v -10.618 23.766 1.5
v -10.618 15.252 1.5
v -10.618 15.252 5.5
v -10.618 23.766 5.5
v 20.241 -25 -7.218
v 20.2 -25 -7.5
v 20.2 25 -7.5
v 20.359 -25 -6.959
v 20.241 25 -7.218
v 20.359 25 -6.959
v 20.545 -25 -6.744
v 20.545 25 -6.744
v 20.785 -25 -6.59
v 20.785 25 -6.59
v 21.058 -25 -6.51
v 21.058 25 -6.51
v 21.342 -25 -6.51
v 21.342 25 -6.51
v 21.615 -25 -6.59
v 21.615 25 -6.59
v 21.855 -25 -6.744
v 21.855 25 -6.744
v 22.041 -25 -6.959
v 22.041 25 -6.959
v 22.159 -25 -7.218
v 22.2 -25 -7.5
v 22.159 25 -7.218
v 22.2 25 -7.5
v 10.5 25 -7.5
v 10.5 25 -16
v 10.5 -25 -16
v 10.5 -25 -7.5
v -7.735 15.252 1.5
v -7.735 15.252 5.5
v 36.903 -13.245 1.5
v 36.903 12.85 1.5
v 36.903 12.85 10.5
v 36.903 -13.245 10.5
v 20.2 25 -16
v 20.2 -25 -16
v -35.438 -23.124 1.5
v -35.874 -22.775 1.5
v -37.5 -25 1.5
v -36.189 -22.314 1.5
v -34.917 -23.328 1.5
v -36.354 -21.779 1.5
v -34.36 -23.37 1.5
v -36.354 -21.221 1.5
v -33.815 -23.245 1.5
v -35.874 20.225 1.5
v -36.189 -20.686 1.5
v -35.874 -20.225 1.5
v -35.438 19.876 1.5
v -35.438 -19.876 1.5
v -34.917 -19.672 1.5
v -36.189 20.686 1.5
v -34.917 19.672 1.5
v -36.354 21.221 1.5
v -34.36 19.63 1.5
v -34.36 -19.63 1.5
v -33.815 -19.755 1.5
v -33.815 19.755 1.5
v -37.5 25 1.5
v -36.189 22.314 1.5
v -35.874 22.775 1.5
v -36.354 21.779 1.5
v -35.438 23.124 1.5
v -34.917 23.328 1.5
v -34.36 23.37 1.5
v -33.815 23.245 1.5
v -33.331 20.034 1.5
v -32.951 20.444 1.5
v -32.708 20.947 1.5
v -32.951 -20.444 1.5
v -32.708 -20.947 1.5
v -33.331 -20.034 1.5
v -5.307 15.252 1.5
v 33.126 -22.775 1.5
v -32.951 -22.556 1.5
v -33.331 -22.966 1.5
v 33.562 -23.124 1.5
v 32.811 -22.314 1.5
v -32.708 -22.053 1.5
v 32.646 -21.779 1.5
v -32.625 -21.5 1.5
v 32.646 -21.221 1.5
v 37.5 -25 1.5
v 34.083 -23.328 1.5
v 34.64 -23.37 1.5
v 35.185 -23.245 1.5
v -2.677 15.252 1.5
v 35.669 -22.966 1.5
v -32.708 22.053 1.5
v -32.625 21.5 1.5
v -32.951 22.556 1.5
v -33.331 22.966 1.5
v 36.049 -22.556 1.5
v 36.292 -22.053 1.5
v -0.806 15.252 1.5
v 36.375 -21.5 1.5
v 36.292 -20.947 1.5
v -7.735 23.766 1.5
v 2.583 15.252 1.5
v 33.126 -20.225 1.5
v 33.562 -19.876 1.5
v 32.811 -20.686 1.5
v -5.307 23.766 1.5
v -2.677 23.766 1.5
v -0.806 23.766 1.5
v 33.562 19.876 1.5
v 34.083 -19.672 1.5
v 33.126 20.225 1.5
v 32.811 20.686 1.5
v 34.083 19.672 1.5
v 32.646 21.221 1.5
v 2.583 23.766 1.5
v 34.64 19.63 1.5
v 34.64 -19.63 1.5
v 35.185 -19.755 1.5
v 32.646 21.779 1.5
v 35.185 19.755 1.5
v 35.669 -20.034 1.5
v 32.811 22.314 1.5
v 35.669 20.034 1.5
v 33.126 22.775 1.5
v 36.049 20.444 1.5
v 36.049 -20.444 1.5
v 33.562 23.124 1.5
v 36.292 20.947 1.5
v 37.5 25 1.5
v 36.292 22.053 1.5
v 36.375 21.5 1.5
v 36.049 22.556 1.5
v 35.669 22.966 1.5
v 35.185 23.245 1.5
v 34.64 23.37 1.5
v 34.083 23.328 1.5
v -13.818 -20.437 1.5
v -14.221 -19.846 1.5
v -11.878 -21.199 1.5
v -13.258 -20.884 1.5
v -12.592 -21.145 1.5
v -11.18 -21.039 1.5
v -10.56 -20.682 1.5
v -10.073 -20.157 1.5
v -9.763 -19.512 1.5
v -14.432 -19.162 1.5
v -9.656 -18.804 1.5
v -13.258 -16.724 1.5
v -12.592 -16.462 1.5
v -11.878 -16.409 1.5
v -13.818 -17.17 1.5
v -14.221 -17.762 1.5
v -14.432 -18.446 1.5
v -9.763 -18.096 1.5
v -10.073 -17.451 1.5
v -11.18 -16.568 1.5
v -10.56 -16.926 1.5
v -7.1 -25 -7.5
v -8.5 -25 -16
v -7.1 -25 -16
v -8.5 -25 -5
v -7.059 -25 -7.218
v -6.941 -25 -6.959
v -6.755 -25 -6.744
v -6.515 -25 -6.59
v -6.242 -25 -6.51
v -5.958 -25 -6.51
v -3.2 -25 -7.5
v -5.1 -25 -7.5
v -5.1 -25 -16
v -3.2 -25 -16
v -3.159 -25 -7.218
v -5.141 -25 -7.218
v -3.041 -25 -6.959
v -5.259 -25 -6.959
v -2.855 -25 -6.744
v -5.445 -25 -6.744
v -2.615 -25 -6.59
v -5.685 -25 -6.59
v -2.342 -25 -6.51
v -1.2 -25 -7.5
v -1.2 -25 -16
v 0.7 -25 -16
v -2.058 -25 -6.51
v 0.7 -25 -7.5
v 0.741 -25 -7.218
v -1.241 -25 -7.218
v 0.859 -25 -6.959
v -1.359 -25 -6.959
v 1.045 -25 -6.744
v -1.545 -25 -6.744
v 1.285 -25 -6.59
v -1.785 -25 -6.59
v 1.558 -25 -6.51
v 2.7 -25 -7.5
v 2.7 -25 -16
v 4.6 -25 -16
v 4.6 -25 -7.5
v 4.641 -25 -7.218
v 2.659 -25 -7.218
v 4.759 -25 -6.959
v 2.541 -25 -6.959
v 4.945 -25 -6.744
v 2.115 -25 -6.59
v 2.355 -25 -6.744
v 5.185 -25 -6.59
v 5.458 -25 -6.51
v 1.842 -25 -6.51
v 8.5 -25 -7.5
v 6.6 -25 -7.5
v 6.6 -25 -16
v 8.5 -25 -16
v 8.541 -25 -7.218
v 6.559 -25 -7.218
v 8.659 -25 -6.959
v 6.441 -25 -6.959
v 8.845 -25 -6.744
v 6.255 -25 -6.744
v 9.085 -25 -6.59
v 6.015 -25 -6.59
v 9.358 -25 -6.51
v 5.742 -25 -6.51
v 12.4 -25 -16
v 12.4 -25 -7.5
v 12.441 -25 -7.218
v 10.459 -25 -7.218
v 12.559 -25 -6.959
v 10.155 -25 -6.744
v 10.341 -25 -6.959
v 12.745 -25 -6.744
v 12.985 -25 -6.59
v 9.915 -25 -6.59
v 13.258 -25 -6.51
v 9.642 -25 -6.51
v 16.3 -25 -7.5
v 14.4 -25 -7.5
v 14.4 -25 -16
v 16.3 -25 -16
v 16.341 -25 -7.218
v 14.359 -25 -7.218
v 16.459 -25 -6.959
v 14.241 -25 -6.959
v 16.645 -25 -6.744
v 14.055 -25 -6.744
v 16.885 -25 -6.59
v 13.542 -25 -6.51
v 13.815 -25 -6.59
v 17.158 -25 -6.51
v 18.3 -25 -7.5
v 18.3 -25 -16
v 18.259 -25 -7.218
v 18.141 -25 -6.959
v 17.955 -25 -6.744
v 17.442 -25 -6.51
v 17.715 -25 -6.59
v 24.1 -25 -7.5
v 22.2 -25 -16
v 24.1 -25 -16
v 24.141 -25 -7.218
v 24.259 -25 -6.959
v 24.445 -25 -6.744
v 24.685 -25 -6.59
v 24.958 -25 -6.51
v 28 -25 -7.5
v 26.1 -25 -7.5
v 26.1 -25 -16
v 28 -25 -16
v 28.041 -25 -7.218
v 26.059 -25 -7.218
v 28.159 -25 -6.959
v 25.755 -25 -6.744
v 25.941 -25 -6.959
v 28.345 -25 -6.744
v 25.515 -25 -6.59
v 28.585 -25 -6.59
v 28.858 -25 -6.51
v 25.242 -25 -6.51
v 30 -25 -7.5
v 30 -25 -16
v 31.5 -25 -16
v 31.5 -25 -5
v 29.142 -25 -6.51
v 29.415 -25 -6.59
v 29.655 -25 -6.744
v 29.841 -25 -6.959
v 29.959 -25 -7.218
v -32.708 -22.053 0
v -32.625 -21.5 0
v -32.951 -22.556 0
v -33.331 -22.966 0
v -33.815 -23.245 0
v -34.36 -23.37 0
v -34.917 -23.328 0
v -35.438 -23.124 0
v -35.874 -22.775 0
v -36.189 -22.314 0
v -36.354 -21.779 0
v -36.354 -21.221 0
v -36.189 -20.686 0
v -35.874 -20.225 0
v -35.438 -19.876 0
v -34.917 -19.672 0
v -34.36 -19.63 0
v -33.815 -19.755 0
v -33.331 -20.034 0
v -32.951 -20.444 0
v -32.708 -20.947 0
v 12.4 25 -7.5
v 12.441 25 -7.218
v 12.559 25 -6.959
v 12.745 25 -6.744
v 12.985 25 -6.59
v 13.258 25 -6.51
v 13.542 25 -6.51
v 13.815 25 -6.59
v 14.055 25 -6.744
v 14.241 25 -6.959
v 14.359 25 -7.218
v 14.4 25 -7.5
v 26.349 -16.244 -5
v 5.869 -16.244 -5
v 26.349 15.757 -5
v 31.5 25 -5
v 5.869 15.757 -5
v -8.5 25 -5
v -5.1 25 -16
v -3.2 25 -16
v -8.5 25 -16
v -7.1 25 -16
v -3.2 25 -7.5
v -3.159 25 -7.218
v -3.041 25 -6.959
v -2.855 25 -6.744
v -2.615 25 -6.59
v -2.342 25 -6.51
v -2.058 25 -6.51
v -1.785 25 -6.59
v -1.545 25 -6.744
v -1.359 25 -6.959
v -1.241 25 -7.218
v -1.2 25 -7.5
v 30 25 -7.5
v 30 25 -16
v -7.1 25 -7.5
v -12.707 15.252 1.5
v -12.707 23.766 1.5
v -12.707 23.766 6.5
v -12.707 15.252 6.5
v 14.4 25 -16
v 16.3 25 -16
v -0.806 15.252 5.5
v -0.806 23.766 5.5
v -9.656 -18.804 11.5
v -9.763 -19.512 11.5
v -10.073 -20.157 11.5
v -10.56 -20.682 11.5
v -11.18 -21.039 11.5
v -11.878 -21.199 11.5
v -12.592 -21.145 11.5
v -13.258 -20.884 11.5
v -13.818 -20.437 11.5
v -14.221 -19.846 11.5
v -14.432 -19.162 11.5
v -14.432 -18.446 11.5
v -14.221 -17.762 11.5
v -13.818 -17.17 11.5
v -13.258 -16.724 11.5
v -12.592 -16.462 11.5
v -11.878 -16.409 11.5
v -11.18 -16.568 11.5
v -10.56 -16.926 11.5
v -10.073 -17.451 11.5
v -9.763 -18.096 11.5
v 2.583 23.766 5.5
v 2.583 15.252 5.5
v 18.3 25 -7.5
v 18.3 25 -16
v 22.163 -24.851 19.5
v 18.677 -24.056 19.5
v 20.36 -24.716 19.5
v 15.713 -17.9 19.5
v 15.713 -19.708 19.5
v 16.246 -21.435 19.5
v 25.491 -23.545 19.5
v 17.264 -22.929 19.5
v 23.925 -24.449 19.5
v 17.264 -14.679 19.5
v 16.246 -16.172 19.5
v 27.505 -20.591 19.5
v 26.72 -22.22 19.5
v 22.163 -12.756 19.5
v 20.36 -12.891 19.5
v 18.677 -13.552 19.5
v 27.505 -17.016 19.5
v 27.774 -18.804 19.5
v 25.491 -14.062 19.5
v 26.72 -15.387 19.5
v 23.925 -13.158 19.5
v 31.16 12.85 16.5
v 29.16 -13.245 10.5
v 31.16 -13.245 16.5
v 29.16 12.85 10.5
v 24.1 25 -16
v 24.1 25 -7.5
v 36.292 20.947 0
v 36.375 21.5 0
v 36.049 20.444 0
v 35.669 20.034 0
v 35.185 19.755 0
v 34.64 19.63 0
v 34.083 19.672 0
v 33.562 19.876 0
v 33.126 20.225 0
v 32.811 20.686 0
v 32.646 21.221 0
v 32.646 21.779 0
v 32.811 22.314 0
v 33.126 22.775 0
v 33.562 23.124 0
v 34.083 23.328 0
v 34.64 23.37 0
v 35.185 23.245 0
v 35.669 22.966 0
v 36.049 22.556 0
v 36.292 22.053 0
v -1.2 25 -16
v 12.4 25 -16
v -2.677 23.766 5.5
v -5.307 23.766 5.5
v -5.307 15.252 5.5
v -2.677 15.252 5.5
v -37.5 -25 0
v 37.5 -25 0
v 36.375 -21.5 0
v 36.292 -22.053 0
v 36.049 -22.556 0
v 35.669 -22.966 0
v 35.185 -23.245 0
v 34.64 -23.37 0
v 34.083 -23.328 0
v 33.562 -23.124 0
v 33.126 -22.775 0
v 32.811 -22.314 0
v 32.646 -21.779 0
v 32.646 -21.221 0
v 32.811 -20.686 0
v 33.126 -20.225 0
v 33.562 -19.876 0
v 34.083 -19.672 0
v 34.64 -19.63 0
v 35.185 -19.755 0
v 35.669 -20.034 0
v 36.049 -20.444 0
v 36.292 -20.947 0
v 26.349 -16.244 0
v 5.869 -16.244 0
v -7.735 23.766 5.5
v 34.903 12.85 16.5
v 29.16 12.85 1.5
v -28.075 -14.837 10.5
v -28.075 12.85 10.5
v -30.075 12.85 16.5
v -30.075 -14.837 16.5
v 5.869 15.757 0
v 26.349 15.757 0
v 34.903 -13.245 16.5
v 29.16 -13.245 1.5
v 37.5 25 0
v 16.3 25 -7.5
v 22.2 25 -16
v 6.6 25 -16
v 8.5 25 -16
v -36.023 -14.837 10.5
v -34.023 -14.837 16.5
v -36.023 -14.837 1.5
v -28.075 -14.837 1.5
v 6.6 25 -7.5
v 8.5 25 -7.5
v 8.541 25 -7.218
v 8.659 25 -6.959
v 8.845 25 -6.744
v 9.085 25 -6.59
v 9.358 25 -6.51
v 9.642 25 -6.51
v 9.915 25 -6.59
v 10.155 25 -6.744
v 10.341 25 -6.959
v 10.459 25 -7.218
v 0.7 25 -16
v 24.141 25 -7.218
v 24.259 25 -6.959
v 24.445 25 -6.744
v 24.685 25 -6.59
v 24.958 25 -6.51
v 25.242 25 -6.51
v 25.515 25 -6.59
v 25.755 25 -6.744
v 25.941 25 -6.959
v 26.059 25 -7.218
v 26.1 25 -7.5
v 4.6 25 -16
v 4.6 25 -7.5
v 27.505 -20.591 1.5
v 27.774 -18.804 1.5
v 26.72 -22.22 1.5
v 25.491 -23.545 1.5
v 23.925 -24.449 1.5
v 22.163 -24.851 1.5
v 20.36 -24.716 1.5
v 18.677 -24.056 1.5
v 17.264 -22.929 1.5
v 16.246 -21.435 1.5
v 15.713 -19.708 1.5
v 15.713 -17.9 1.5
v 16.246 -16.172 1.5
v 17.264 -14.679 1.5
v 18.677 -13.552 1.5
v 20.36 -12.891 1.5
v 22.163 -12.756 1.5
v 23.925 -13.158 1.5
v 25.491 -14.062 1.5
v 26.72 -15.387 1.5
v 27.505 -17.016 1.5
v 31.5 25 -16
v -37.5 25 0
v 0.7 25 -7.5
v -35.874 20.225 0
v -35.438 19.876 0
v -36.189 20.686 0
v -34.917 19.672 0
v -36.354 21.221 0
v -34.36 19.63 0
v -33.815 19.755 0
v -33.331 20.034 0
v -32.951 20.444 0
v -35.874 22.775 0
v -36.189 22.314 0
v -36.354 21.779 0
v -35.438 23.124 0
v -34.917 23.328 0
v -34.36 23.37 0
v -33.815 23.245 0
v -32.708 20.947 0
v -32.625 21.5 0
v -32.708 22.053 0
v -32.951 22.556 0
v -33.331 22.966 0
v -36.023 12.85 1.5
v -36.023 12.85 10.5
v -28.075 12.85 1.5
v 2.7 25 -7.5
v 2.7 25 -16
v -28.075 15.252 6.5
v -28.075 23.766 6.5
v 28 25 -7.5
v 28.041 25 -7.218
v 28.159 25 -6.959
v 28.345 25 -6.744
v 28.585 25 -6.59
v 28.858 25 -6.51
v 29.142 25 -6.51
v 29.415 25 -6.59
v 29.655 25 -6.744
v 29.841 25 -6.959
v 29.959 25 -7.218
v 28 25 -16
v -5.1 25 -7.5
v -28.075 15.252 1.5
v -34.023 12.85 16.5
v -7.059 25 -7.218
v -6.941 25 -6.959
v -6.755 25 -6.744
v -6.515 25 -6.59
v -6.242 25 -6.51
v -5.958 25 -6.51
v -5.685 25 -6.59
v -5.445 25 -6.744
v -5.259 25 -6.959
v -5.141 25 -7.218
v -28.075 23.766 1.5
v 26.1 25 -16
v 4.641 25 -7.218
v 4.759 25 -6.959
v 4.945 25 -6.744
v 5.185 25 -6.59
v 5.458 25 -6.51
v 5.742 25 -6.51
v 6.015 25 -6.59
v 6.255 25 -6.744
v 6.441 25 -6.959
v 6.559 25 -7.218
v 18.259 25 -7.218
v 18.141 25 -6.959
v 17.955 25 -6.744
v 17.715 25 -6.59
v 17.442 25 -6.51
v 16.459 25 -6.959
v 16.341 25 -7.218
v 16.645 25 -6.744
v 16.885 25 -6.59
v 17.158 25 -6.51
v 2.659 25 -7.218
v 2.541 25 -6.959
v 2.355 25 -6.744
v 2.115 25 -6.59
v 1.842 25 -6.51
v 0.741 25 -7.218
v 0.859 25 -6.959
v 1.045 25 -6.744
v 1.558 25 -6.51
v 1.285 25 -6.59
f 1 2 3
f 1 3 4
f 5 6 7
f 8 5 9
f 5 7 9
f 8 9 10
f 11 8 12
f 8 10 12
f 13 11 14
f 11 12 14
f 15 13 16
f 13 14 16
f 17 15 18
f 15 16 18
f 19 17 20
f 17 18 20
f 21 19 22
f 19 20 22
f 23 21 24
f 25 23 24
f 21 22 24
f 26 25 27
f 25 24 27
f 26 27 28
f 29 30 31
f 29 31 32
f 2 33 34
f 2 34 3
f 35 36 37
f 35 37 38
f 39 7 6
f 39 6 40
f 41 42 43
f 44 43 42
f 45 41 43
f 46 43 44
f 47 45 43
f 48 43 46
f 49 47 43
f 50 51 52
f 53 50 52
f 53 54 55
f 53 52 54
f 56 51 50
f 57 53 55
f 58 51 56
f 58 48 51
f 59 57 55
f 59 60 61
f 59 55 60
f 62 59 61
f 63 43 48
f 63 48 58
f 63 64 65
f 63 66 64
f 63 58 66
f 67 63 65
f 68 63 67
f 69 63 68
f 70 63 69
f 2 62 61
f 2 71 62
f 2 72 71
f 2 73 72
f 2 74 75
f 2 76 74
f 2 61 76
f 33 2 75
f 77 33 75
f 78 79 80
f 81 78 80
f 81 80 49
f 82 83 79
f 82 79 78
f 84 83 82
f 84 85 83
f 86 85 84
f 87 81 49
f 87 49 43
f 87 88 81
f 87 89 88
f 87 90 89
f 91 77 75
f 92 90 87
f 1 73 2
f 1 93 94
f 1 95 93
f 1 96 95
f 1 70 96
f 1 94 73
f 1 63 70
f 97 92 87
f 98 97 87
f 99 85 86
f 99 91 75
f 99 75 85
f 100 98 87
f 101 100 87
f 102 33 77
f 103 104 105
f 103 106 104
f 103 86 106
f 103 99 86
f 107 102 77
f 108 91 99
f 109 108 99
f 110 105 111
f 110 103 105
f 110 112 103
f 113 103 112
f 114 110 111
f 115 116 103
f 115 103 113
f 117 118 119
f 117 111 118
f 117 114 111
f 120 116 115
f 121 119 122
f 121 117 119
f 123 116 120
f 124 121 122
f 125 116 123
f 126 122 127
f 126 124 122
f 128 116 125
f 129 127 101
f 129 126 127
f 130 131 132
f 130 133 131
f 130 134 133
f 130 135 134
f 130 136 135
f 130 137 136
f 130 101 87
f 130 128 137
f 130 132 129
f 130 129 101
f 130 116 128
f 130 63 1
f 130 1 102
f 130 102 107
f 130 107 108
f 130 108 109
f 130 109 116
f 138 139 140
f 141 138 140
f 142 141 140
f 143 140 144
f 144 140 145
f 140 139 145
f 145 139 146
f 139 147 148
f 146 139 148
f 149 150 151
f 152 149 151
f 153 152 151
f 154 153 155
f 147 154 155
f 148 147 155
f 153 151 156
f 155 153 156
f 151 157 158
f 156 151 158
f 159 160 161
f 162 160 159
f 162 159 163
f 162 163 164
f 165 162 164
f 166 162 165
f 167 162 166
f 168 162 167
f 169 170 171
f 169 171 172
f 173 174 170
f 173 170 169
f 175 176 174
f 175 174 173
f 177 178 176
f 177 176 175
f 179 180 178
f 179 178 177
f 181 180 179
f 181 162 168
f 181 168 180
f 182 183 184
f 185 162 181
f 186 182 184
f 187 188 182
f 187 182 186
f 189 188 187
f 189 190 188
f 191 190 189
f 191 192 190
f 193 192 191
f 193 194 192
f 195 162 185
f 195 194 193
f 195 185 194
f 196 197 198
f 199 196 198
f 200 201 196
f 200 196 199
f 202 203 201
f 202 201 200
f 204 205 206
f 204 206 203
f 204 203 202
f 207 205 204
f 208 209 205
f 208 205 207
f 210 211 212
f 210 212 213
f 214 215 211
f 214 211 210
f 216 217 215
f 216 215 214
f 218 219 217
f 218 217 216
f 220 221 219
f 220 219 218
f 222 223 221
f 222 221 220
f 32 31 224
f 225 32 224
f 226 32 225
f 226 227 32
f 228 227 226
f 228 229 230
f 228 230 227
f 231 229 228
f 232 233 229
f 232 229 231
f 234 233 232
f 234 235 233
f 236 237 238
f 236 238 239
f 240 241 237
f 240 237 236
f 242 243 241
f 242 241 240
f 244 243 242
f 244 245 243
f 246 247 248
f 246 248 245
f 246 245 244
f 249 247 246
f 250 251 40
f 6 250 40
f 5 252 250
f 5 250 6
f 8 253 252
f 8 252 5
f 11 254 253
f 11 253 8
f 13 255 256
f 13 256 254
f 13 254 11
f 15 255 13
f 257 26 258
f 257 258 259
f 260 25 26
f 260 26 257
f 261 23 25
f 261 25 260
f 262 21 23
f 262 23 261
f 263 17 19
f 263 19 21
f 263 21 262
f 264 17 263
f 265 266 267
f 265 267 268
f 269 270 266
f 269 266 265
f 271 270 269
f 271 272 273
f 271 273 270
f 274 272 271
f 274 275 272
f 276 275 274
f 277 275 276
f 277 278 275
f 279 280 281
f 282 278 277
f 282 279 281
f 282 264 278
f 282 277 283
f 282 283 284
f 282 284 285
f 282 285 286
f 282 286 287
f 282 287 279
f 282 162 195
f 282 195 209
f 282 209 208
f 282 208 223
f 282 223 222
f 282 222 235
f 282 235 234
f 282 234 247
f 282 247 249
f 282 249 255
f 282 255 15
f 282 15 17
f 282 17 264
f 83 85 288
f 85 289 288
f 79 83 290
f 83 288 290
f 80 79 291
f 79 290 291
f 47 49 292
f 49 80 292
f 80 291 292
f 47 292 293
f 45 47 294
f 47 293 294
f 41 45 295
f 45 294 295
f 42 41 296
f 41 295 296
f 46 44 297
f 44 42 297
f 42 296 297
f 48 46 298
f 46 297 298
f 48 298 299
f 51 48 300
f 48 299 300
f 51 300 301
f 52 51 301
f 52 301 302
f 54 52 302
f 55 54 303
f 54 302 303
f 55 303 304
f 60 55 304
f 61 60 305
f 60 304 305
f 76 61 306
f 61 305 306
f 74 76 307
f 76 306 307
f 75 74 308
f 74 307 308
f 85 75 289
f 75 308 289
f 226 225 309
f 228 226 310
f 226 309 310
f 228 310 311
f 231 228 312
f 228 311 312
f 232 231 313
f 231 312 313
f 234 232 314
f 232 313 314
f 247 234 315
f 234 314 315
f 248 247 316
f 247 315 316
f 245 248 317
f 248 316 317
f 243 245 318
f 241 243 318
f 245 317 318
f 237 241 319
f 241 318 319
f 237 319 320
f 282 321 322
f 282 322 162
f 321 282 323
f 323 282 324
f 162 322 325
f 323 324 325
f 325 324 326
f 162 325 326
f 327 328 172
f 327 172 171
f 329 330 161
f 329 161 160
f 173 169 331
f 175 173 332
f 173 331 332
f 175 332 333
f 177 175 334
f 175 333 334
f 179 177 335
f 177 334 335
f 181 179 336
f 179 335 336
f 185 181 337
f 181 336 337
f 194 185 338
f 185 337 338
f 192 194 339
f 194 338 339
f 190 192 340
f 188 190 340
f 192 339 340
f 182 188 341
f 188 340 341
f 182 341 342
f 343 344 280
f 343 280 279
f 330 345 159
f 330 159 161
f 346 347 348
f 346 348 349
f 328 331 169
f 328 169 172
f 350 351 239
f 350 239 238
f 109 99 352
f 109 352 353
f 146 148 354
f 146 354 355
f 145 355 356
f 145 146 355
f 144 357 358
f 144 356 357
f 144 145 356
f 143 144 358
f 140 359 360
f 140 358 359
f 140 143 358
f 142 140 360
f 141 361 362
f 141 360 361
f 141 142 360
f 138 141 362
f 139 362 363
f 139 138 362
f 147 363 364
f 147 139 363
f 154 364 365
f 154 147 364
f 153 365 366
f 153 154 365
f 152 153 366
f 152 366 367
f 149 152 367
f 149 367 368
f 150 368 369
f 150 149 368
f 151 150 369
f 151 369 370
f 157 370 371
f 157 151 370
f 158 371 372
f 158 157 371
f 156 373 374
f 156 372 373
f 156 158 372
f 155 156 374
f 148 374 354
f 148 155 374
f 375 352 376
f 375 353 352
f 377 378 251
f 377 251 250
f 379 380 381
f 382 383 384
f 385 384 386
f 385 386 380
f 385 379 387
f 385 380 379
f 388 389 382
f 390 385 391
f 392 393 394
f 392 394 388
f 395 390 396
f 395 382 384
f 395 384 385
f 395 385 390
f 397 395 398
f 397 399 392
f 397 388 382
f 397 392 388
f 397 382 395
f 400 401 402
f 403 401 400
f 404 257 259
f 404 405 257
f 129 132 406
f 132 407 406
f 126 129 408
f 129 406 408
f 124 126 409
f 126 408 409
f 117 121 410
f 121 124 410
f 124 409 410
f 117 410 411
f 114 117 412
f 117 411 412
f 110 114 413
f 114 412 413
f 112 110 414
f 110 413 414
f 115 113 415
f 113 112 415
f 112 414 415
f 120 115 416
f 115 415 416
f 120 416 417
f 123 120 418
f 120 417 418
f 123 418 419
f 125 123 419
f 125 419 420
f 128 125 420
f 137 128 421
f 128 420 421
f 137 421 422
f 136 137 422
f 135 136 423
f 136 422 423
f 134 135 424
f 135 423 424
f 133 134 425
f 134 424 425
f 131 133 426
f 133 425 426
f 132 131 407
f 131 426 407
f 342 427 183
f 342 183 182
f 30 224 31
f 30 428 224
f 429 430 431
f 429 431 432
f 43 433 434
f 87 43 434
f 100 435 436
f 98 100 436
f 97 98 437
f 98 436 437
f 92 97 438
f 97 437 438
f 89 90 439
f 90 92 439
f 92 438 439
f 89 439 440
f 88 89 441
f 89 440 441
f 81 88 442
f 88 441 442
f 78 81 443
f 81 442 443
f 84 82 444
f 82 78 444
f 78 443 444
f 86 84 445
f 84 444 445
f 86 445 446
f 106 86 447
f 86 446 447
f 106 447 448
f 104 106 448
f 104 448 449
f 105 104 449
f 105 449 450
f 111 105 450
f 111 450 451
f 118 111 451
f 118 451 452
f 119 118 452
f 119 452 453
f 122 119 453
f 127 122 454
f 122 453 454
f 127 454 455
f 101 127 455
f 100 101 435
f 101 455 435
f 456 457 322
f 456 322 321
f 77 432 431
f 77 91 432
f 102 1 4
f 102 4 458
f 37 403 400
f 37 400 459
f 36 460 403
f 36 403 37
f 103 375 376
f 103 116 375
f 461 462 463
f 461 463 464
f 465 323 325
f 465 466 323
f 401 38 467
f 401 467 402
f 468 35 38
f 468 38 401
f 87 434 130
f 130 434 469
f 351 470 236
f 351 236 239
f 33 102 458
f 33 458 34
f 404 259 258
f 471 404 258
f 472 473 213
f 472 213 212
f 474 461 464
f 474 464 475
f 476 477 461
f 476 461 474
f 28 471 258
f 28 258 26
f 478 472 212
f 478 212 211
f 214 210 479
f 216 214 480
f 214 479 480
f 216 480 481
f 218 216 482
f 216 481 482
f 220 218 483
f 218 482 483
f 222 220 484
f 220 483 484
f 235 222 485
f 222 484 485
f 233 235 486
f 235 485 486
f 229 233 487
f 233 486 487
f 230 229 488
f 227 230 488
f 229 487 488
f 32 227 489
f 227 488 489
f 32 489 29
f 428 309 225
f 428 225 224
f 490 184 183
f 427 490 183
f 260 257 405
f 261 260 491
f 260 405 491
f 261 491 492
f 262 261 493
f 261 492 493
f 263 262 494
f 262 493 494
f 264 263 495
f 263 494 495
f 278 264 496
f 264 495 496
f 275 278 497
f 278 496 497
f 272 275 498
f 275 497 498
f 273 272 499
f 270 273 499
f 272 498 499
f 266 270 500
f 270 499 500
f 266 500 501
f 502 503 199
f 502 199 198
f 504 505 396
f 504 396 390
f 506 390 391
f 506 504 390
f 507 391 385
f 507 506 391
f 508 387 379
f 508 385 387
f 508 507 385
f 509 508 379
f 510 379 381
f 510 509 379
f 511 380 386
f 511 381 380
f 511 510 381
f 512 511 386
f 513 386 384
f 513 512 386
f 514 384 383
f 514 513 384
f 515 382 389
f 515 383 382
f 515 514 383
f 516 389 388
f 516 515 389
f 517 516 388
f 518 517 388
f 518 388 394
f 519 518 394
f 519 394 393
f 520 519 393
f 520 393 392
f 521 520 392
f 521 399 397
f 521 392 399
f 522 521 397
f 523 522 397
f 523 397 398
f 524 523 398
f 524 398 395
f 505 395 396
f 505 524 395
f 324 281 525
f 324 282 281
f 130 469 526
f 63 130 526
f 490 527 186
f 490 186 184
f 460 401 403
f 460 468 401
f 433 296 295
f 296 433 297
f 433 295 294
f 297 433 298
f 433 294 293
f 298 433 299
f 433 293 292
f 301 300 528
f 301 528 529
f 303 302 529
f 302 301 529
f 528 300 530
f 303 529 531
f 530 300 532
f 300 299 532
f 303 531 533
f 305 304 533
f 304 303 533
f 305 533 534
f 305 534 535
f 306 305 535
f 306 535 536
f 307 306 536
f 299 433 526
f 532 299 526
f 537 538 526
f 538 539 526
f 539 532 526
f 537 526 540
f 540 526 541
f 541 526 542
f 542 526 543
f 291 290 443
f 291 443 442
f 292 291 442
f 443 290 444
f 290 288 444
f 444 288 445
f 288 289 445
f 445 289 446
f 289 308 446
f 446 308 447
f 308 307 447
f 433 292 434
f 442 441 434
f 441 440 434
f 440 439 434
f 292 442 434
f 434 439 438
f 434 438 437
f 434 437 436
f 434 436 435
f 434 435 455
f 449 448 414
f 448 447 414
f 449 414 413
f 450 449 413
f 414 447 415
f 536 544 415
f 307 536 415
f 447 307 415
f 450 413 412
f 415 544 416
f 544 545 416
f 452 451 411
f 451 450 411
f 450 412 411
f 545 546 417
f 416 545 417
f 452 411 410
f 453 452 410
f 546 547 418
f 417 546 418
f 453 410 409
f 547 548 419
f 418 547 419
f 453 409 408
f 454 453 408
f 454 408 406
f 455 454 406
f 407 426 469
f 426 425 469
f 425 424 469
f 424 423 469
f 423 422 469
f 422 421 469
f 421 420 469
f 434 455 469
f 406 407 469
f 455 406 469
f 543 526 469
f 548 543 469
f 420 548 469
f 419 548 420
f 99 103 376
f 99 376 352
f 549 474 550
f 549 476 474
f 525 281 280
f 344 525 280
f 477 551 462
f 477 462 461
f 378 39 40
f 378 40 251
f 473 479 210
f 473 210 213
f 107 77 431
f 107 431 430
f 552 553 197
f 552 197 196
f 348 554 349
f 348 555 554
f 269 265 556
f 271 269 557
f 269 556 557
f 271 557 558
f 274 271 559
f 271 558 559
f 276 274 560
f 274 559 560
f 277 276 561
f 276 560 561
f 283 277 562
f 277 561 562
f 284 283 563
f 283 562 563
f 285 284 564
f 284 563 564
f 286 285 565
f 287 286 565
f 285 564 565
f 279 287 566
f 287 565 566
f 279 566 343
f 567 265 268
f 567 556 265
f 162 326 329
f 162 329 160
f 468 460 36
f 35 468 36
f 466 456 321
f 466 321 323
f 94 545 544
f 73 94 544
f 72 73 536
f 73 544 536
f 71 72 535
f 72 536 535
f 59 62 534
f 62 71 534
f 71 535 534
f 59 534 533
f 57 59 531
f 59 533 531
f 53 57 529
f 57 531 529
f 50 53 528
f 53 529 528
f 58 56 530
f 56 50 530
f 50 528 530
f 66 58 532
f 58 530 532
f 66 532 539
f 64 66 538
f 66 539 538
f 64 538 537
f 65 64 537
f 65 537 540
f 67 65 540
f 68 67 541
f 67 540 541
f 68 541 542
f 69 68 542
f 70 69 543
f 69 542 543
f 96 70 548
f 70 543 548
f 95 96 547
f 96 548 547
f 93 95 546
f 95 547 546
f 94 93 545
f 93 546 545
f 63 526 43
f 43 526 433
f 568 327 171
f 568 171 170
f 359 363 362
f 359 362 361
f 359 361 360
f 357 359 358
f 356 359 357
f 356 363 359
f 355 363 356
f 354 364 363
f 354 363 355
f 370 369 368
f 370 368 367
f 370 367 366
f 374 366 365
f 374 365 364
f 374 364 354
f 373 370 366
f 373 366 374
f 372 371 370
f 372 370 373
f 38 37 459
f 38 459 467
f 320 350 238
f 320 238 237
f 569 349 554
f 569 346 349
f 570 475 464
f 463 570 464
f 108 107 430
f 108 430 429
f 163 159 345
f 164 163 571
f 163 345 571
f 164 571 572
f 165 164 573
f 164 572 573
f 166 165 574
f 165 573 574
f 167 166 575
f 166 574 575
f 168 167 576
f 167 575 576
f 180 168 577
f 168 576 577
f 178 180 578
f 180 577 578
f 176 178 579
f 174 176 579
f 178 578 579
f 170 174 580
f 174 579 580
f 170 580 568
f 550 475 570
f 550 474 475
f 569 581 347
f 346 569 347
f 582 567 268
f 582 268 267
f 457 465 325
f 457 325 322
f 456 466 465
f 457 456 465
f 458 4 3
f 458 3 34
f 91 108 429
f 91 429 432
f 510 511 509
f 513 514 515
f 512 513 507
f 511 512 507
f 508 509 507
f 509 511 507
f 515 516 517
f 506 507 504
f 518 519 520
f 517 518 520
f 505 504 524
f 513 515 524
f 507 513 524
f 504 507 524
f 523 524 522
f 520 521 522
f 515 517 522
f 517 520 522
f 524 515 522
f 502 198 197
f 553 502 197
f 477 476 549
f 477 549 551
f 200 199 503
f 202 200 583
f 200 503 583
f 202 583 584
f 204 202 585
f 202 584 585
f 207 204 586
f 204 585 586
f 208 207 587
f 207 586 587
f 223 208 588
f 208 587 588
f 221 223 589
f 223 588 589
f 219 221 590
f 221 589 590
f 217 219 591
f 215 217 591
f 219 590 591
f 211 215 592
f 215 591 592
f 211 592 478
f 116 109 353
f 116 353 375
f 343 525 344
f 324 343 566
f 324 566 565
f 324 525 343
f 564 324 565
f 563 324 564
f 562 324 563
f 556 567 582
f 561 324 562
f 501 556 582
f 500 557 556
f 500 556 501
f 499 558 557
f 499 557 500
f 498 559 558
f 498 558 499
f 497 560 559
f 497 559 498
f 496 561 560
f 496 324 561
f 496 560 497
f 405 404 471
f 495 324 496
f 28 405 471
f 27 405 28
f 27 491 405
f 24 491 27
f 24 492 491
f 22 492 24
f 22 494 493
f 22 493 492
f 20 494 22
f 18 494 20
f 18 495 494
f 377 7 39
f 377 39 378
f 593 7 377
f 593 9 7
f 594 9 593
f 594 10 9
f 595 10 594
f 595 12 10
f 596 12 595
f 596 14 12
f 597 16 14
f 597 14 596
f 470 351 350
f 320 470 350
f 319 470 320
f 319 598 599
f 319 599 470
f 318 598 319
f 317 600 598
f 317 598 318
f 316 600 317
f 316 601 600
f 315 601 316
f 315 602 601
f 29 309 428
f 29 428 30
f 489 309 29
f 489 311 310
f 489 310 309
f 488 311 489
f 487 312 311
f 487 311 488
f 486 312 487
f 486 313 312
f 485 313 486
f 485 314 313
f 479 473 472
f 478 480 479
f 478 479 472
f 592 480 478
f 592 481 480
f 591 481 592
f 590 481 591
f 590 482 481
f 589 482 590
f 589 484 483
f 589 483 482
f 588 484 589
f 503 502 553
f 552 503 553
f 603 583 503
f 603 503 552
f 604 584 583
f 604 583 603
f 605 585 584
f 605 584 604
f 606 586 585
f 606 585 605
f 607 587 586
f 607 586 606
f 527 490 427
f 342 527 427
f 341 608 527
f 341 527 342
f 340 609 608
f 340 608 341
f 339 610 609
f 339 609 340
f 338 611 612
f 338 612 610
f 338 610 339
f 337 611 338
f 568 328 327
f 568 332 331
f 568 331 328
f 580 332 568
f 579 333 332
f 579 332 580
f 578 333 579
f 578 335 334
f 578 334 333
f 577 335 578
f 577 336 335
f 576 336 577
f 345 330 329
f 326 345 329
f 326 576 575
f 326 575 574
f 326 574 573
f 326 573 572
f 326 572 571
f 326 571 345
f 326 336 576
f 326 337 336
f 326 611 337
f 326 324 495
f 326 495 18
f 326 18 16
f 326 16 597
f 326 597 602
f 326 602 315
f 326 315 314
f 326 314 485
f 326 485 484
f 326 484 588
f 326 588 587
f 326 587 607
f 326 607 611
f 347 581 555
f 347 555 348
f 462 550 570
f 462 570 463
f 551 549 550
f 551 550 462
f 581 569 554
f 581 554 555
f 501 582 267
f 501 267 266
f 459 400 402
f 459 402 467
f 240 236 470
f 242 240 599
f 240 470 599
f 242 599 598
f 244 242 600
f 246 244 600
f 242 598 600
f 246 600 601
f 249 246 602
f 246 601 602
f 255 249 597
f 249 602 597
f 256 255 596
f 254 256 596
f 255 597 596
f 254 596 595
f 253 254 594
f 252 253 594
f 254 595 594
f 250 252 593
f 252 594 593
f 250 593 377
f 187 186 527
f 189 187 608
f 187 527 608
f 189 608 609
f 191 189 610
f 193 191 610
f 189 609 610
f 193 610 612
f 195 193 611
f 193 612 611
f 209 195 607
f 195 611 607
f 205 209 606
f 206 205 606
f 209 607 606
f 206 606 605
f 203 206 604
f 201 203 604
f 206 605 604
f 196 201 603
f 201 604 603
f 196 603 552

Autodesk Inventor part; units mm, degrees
ref_plane "YZ Plane" through (0, 0, 0) normal (1, 0, 0) x (0, 1, 0)
ref_plane "XZ Plane" through (0, 0, 0) normal (0, 1, 0) x (-1, 0, 0)
ref_plane "XY Plane" through (0, 0, 0) normal (0, 0, 1) x (1, 0, 0)
sketch "Skizze1" plane through (0, 0, 0) normal (0, 0, 1) x (1, 0, 0)
  line L0 (-37.5, -25) -> (37.5, -25)
  line L1 (37.5, -25) -> (37.5, 25)
  line L2 (37.5, 25) -> (-37.5, 25)
  line L3 (-37.5, 25) -> (-37.5, -25)
  line L4 (-37.5, -25) -> (37.5, 25) construction
  line L5 (37.5, -25) -> (-37.5, 25) construction
  circle A0 centre (-34.5, 21.5) radius 1.875
  circle A1 centre (-34.5, -21.5) radius 1.875
  line L6 (-34.5, 21.5) -> (-34.5, -21.5) construction
  line L7 (-37.5, 0) -> (37.5, 0) construction
  line L8 (34.5, -21.5) -> (-34.5, -21.5) construction
  line L9 (-34.5, -21.5) -> (-34.5, 21.5) construction
  line L10 (-34.5, 21.5) -> (34.5, 21.5) construction
  line L11 (34.5, 21.5) -> (34.5, -21.5) construction
  line L12 (34.5, -21.5) -> (-34.5, 21.5) construction
  line L13 (-34.5, -21.5) -> (34.5, 21.5) construction
  circle A2 centre (34.5, 21.5) radius 1.875
  circle A3 centre (34.5, -21.5) radius 1.875
  point P0 (0, 0)
  point P1 (-34.5, 0)
  dimension "d0" = 75
  dimension "d1" = 50
  dimension "d2" = 43
  dimension "d3" = 3.75
  dimension "d4" = 69
extrude "Extrusion1" add sketch "Skizze1" along normal blind 1.5
sketch "Skizze2" plane through (0, 0, 1.5) normal (0, 0, 1) x (1, 0, 0)
  circle A0 centre (21.7096, -18.8038) radius 6.0646
  circle A1 centre (-12.0575, -18.8038) radius 2.4017
  line L0 (-28.0752, 23.7658) -> (-12.7068, 23.7658)
  line L1 (-12.7068, 23.7658) -> (-12.7068, 15.2518)
  line L2 (-12.7068, 15.2518) -> (-28.0752, 15.2518)
  line L3 (-28.0752, 15.2518) -> (-28.0752, 23.7658)
  line L4 (-36.0228, 12.8499) -> (-28.0752, 12.8499)
  line L5 (-28.0752, 12.8499) -> (-28.0752, -14.8371)
  line L6 (-28.0752, -14.8371) -> (-36.0228, -14.8371)
  line L7 (-36.0228, -14.8371) -> (-36.0228, 12.8499)
  line L8 (29.1595, 12.8499) -> (36.903, 12.8499)
  line L9 (36.903, 12.8499) -> (36.903, -13.245)
  line L10 (36.903, -13.245) -> (29.1595, -13.245)
  line L11 (29.1595, -13.245) -> (29.1595, 12.8499)
  line L12 (-10.6178, 23.7658) -> (-7.7349, 23.7658)
  line L13 (-7.7349, 23.7658) -> (-7.7349, 15.2518)
  line L14 (-7.7349, 15.2518) -> (-10.6178, 15.2518)
  line L15 (-10.6178, 15.2518) -> (-10.6178, 23.7658)
  line L16 (-5.3072, 23.7658) -> (-2.6772, 23.7658)
  line L17 (-2.6772, 23.7658) -> (-2.6772, 15.2518)
  line L18 (-2.6772, 15.2518) -> (-5.3072, 15.2518)
  line L19 (-5.3072, 15.2518) -> (-5.3072, 23.7658)
  line L20 (-0.8059, 23.7658) -> (2.5828, 23.7658)
  line L21 (2.5828, 23.7658) -> (2.5828, 15.2518)
  line L22 (2.5828, 15.2518) -> (-0.8059, 15.2518)
  line L23 (-0.8059, 15.2518) -> (-0.8059, 23.7658)
  point P0 (0, 0)
extrude "Extrusion2" add sketch "Skizze2" along normal blind 15 separate body contours L4 L5 L6 L7 | L8 L9 L10 L11
extrude "Extrusion3" add sketch "Skizze2" along normal blind 18 separate body contours A0
extrude "Extrusion4" add sketch "Skizze2" along normal blind 10 separate body contours A1
extrude "Extrusion5" add sketch "Skizze2" along normal blind 5 separate body contours L0 L1 L2 L3
extrude "Extrusion6" add sketch "Skizze2" along normal blind 4 contours L12 L13 L14 L15 | L16 L17 L18 L19 | L20 L21 L22 L23 bodies 1
chamfer "Fase1" distance 2 distance2 6 1 edges at (-36.0228, -0.9936, 16.5) measured on face at (-33.3736, 3.6209, 16.5)
chamfer "Fase2" distance 2 distance2 6 1 edges at (-28.0752, -0.9936, 16.5) measured on face at (-32.0403, 3.6209, 16.5)
chamfer "Fase3" distance 2 distance2 6 1 edges at (29.1595, -0.1976, 16.5) measured on face at (31.7407, -4.5467, 16.5)
chamfer "Fase4" distance 2 distance2 6 1 edges at (36.903, -0.1976, 16.5) measured on face at (33.074, 4.1516, 16.5)
sketch "Skizze3" plane through (0, 0, 0) normal (0, 0, -1) x (-1, 0, 0)
  line L0 (-5.8688, -16.2438) -> (-26.3494, -16.2438)
  line L1 (-26.3494, -16.2438) -> (-26.3494, 15.757)
  line L2 (-26.3494, 15.757) -> (-5.8688, 15.757)
  line L3 (-5.8688, 15.757) -> (-5.8688, -16.2438)
  point P0 (0, 0)
extrude "Extrusion7" add sketch "Skizze3" along normal blind 5 separate body
sketch "Skizze4" plane through (0, 0, -5) normal (0, 0, -1) x (-1, 0, 0)
  line L0 (-26.3494, -16.2438) -> (-26.3494, 15.757) projected
  line L1 (-26.3494, 15.757) -> (-5.8688, 15.757) projected
  line L2 (-5.8688, 15.757) -> (-5.8688, -16.2438) projected
  line L3 (-5.8688, -16.2438) -> (-26.3494, -16.2438) projected
  circle A0 centre (-34.5, -21.5) radius 1.875 projected
  circle A1 centre (-34.5, 21.5) radius 1.875 projected
  circle A2 centre (34.5, -21.5) radius 1.875 projected
  circle A3 centre (34.5, 21.5) radius 1.875 projected
  line L4 (37.5, -25) -> (-37.5, -25) projected
  line L5 (37.5, 25) -> (37.5, -25) projected
  line L6 (-37.5, 25) -> (37.5, 25) projected
  line L7 (-37.5, -25) -> (-37.5, 25) projected
  line L8 (8.5, -25) -> (-31.5, -25)
  line L9 (-31.5, -25) -> (-31.5, 25)
  line L10 (-31.5, 25) -> (8.5, 25)
  line L11 (8.5, 25) -> (8.5, -25)
  point P0 (0, 0)
  dimension "d31" = 6
  dimension "d32" = 40
extrude "Extrusion8" add sketch "Skizze4" along normal blind 11 contours L0 L1 L2 L3 | L4 L9 L6 L11 bodies 6
sketch "Skizze5" plane through (-8.5, 25, -5) normal (0, 1, 0) x (1, 0, 0)
  line L0 (40, 0) -> (0, 0) projected
  line L1 (40, 0) -> (40, 11) projected
  line L2 (0, 11) -> (40, 11) projected
  line L3 (0, 0) -> (0, 11) projected
  line L4 (1.4, 11) -> (3.4, 11)
  line L5 (3.4, 11) -> (3.4, 2.5)
  line L6 (2.4, 1.5) -> (2.4, 1.5)
  line L7 (1.4, 2.5) -> (1.4, 11)
  arc A0 (1.4, 2.5) -> (2.4, 1.5) centre (2.4, 2.5) ccw
  arc A1 (2.4, 1.5) -> (3.4, 2.5) centre (2.4, 2.5) ccw
  point P0 (8.5, -5)
  dimension "d35" = 1
  dimension "d36" = 1.4
  dimension "d37" = 2
  dimension "d38" = 1.5
extrude "Extrusion9" cut sketch "Skizze5" against normal through all contours L5 A1 A0 L7 L2 bodies 6
pattern_linear "Rechteckige Anordnung1" count 10 spacing 3.9 along (1, 0, 0) of "Extrusion9" bodies 6
properties part number "StepperDriver"
